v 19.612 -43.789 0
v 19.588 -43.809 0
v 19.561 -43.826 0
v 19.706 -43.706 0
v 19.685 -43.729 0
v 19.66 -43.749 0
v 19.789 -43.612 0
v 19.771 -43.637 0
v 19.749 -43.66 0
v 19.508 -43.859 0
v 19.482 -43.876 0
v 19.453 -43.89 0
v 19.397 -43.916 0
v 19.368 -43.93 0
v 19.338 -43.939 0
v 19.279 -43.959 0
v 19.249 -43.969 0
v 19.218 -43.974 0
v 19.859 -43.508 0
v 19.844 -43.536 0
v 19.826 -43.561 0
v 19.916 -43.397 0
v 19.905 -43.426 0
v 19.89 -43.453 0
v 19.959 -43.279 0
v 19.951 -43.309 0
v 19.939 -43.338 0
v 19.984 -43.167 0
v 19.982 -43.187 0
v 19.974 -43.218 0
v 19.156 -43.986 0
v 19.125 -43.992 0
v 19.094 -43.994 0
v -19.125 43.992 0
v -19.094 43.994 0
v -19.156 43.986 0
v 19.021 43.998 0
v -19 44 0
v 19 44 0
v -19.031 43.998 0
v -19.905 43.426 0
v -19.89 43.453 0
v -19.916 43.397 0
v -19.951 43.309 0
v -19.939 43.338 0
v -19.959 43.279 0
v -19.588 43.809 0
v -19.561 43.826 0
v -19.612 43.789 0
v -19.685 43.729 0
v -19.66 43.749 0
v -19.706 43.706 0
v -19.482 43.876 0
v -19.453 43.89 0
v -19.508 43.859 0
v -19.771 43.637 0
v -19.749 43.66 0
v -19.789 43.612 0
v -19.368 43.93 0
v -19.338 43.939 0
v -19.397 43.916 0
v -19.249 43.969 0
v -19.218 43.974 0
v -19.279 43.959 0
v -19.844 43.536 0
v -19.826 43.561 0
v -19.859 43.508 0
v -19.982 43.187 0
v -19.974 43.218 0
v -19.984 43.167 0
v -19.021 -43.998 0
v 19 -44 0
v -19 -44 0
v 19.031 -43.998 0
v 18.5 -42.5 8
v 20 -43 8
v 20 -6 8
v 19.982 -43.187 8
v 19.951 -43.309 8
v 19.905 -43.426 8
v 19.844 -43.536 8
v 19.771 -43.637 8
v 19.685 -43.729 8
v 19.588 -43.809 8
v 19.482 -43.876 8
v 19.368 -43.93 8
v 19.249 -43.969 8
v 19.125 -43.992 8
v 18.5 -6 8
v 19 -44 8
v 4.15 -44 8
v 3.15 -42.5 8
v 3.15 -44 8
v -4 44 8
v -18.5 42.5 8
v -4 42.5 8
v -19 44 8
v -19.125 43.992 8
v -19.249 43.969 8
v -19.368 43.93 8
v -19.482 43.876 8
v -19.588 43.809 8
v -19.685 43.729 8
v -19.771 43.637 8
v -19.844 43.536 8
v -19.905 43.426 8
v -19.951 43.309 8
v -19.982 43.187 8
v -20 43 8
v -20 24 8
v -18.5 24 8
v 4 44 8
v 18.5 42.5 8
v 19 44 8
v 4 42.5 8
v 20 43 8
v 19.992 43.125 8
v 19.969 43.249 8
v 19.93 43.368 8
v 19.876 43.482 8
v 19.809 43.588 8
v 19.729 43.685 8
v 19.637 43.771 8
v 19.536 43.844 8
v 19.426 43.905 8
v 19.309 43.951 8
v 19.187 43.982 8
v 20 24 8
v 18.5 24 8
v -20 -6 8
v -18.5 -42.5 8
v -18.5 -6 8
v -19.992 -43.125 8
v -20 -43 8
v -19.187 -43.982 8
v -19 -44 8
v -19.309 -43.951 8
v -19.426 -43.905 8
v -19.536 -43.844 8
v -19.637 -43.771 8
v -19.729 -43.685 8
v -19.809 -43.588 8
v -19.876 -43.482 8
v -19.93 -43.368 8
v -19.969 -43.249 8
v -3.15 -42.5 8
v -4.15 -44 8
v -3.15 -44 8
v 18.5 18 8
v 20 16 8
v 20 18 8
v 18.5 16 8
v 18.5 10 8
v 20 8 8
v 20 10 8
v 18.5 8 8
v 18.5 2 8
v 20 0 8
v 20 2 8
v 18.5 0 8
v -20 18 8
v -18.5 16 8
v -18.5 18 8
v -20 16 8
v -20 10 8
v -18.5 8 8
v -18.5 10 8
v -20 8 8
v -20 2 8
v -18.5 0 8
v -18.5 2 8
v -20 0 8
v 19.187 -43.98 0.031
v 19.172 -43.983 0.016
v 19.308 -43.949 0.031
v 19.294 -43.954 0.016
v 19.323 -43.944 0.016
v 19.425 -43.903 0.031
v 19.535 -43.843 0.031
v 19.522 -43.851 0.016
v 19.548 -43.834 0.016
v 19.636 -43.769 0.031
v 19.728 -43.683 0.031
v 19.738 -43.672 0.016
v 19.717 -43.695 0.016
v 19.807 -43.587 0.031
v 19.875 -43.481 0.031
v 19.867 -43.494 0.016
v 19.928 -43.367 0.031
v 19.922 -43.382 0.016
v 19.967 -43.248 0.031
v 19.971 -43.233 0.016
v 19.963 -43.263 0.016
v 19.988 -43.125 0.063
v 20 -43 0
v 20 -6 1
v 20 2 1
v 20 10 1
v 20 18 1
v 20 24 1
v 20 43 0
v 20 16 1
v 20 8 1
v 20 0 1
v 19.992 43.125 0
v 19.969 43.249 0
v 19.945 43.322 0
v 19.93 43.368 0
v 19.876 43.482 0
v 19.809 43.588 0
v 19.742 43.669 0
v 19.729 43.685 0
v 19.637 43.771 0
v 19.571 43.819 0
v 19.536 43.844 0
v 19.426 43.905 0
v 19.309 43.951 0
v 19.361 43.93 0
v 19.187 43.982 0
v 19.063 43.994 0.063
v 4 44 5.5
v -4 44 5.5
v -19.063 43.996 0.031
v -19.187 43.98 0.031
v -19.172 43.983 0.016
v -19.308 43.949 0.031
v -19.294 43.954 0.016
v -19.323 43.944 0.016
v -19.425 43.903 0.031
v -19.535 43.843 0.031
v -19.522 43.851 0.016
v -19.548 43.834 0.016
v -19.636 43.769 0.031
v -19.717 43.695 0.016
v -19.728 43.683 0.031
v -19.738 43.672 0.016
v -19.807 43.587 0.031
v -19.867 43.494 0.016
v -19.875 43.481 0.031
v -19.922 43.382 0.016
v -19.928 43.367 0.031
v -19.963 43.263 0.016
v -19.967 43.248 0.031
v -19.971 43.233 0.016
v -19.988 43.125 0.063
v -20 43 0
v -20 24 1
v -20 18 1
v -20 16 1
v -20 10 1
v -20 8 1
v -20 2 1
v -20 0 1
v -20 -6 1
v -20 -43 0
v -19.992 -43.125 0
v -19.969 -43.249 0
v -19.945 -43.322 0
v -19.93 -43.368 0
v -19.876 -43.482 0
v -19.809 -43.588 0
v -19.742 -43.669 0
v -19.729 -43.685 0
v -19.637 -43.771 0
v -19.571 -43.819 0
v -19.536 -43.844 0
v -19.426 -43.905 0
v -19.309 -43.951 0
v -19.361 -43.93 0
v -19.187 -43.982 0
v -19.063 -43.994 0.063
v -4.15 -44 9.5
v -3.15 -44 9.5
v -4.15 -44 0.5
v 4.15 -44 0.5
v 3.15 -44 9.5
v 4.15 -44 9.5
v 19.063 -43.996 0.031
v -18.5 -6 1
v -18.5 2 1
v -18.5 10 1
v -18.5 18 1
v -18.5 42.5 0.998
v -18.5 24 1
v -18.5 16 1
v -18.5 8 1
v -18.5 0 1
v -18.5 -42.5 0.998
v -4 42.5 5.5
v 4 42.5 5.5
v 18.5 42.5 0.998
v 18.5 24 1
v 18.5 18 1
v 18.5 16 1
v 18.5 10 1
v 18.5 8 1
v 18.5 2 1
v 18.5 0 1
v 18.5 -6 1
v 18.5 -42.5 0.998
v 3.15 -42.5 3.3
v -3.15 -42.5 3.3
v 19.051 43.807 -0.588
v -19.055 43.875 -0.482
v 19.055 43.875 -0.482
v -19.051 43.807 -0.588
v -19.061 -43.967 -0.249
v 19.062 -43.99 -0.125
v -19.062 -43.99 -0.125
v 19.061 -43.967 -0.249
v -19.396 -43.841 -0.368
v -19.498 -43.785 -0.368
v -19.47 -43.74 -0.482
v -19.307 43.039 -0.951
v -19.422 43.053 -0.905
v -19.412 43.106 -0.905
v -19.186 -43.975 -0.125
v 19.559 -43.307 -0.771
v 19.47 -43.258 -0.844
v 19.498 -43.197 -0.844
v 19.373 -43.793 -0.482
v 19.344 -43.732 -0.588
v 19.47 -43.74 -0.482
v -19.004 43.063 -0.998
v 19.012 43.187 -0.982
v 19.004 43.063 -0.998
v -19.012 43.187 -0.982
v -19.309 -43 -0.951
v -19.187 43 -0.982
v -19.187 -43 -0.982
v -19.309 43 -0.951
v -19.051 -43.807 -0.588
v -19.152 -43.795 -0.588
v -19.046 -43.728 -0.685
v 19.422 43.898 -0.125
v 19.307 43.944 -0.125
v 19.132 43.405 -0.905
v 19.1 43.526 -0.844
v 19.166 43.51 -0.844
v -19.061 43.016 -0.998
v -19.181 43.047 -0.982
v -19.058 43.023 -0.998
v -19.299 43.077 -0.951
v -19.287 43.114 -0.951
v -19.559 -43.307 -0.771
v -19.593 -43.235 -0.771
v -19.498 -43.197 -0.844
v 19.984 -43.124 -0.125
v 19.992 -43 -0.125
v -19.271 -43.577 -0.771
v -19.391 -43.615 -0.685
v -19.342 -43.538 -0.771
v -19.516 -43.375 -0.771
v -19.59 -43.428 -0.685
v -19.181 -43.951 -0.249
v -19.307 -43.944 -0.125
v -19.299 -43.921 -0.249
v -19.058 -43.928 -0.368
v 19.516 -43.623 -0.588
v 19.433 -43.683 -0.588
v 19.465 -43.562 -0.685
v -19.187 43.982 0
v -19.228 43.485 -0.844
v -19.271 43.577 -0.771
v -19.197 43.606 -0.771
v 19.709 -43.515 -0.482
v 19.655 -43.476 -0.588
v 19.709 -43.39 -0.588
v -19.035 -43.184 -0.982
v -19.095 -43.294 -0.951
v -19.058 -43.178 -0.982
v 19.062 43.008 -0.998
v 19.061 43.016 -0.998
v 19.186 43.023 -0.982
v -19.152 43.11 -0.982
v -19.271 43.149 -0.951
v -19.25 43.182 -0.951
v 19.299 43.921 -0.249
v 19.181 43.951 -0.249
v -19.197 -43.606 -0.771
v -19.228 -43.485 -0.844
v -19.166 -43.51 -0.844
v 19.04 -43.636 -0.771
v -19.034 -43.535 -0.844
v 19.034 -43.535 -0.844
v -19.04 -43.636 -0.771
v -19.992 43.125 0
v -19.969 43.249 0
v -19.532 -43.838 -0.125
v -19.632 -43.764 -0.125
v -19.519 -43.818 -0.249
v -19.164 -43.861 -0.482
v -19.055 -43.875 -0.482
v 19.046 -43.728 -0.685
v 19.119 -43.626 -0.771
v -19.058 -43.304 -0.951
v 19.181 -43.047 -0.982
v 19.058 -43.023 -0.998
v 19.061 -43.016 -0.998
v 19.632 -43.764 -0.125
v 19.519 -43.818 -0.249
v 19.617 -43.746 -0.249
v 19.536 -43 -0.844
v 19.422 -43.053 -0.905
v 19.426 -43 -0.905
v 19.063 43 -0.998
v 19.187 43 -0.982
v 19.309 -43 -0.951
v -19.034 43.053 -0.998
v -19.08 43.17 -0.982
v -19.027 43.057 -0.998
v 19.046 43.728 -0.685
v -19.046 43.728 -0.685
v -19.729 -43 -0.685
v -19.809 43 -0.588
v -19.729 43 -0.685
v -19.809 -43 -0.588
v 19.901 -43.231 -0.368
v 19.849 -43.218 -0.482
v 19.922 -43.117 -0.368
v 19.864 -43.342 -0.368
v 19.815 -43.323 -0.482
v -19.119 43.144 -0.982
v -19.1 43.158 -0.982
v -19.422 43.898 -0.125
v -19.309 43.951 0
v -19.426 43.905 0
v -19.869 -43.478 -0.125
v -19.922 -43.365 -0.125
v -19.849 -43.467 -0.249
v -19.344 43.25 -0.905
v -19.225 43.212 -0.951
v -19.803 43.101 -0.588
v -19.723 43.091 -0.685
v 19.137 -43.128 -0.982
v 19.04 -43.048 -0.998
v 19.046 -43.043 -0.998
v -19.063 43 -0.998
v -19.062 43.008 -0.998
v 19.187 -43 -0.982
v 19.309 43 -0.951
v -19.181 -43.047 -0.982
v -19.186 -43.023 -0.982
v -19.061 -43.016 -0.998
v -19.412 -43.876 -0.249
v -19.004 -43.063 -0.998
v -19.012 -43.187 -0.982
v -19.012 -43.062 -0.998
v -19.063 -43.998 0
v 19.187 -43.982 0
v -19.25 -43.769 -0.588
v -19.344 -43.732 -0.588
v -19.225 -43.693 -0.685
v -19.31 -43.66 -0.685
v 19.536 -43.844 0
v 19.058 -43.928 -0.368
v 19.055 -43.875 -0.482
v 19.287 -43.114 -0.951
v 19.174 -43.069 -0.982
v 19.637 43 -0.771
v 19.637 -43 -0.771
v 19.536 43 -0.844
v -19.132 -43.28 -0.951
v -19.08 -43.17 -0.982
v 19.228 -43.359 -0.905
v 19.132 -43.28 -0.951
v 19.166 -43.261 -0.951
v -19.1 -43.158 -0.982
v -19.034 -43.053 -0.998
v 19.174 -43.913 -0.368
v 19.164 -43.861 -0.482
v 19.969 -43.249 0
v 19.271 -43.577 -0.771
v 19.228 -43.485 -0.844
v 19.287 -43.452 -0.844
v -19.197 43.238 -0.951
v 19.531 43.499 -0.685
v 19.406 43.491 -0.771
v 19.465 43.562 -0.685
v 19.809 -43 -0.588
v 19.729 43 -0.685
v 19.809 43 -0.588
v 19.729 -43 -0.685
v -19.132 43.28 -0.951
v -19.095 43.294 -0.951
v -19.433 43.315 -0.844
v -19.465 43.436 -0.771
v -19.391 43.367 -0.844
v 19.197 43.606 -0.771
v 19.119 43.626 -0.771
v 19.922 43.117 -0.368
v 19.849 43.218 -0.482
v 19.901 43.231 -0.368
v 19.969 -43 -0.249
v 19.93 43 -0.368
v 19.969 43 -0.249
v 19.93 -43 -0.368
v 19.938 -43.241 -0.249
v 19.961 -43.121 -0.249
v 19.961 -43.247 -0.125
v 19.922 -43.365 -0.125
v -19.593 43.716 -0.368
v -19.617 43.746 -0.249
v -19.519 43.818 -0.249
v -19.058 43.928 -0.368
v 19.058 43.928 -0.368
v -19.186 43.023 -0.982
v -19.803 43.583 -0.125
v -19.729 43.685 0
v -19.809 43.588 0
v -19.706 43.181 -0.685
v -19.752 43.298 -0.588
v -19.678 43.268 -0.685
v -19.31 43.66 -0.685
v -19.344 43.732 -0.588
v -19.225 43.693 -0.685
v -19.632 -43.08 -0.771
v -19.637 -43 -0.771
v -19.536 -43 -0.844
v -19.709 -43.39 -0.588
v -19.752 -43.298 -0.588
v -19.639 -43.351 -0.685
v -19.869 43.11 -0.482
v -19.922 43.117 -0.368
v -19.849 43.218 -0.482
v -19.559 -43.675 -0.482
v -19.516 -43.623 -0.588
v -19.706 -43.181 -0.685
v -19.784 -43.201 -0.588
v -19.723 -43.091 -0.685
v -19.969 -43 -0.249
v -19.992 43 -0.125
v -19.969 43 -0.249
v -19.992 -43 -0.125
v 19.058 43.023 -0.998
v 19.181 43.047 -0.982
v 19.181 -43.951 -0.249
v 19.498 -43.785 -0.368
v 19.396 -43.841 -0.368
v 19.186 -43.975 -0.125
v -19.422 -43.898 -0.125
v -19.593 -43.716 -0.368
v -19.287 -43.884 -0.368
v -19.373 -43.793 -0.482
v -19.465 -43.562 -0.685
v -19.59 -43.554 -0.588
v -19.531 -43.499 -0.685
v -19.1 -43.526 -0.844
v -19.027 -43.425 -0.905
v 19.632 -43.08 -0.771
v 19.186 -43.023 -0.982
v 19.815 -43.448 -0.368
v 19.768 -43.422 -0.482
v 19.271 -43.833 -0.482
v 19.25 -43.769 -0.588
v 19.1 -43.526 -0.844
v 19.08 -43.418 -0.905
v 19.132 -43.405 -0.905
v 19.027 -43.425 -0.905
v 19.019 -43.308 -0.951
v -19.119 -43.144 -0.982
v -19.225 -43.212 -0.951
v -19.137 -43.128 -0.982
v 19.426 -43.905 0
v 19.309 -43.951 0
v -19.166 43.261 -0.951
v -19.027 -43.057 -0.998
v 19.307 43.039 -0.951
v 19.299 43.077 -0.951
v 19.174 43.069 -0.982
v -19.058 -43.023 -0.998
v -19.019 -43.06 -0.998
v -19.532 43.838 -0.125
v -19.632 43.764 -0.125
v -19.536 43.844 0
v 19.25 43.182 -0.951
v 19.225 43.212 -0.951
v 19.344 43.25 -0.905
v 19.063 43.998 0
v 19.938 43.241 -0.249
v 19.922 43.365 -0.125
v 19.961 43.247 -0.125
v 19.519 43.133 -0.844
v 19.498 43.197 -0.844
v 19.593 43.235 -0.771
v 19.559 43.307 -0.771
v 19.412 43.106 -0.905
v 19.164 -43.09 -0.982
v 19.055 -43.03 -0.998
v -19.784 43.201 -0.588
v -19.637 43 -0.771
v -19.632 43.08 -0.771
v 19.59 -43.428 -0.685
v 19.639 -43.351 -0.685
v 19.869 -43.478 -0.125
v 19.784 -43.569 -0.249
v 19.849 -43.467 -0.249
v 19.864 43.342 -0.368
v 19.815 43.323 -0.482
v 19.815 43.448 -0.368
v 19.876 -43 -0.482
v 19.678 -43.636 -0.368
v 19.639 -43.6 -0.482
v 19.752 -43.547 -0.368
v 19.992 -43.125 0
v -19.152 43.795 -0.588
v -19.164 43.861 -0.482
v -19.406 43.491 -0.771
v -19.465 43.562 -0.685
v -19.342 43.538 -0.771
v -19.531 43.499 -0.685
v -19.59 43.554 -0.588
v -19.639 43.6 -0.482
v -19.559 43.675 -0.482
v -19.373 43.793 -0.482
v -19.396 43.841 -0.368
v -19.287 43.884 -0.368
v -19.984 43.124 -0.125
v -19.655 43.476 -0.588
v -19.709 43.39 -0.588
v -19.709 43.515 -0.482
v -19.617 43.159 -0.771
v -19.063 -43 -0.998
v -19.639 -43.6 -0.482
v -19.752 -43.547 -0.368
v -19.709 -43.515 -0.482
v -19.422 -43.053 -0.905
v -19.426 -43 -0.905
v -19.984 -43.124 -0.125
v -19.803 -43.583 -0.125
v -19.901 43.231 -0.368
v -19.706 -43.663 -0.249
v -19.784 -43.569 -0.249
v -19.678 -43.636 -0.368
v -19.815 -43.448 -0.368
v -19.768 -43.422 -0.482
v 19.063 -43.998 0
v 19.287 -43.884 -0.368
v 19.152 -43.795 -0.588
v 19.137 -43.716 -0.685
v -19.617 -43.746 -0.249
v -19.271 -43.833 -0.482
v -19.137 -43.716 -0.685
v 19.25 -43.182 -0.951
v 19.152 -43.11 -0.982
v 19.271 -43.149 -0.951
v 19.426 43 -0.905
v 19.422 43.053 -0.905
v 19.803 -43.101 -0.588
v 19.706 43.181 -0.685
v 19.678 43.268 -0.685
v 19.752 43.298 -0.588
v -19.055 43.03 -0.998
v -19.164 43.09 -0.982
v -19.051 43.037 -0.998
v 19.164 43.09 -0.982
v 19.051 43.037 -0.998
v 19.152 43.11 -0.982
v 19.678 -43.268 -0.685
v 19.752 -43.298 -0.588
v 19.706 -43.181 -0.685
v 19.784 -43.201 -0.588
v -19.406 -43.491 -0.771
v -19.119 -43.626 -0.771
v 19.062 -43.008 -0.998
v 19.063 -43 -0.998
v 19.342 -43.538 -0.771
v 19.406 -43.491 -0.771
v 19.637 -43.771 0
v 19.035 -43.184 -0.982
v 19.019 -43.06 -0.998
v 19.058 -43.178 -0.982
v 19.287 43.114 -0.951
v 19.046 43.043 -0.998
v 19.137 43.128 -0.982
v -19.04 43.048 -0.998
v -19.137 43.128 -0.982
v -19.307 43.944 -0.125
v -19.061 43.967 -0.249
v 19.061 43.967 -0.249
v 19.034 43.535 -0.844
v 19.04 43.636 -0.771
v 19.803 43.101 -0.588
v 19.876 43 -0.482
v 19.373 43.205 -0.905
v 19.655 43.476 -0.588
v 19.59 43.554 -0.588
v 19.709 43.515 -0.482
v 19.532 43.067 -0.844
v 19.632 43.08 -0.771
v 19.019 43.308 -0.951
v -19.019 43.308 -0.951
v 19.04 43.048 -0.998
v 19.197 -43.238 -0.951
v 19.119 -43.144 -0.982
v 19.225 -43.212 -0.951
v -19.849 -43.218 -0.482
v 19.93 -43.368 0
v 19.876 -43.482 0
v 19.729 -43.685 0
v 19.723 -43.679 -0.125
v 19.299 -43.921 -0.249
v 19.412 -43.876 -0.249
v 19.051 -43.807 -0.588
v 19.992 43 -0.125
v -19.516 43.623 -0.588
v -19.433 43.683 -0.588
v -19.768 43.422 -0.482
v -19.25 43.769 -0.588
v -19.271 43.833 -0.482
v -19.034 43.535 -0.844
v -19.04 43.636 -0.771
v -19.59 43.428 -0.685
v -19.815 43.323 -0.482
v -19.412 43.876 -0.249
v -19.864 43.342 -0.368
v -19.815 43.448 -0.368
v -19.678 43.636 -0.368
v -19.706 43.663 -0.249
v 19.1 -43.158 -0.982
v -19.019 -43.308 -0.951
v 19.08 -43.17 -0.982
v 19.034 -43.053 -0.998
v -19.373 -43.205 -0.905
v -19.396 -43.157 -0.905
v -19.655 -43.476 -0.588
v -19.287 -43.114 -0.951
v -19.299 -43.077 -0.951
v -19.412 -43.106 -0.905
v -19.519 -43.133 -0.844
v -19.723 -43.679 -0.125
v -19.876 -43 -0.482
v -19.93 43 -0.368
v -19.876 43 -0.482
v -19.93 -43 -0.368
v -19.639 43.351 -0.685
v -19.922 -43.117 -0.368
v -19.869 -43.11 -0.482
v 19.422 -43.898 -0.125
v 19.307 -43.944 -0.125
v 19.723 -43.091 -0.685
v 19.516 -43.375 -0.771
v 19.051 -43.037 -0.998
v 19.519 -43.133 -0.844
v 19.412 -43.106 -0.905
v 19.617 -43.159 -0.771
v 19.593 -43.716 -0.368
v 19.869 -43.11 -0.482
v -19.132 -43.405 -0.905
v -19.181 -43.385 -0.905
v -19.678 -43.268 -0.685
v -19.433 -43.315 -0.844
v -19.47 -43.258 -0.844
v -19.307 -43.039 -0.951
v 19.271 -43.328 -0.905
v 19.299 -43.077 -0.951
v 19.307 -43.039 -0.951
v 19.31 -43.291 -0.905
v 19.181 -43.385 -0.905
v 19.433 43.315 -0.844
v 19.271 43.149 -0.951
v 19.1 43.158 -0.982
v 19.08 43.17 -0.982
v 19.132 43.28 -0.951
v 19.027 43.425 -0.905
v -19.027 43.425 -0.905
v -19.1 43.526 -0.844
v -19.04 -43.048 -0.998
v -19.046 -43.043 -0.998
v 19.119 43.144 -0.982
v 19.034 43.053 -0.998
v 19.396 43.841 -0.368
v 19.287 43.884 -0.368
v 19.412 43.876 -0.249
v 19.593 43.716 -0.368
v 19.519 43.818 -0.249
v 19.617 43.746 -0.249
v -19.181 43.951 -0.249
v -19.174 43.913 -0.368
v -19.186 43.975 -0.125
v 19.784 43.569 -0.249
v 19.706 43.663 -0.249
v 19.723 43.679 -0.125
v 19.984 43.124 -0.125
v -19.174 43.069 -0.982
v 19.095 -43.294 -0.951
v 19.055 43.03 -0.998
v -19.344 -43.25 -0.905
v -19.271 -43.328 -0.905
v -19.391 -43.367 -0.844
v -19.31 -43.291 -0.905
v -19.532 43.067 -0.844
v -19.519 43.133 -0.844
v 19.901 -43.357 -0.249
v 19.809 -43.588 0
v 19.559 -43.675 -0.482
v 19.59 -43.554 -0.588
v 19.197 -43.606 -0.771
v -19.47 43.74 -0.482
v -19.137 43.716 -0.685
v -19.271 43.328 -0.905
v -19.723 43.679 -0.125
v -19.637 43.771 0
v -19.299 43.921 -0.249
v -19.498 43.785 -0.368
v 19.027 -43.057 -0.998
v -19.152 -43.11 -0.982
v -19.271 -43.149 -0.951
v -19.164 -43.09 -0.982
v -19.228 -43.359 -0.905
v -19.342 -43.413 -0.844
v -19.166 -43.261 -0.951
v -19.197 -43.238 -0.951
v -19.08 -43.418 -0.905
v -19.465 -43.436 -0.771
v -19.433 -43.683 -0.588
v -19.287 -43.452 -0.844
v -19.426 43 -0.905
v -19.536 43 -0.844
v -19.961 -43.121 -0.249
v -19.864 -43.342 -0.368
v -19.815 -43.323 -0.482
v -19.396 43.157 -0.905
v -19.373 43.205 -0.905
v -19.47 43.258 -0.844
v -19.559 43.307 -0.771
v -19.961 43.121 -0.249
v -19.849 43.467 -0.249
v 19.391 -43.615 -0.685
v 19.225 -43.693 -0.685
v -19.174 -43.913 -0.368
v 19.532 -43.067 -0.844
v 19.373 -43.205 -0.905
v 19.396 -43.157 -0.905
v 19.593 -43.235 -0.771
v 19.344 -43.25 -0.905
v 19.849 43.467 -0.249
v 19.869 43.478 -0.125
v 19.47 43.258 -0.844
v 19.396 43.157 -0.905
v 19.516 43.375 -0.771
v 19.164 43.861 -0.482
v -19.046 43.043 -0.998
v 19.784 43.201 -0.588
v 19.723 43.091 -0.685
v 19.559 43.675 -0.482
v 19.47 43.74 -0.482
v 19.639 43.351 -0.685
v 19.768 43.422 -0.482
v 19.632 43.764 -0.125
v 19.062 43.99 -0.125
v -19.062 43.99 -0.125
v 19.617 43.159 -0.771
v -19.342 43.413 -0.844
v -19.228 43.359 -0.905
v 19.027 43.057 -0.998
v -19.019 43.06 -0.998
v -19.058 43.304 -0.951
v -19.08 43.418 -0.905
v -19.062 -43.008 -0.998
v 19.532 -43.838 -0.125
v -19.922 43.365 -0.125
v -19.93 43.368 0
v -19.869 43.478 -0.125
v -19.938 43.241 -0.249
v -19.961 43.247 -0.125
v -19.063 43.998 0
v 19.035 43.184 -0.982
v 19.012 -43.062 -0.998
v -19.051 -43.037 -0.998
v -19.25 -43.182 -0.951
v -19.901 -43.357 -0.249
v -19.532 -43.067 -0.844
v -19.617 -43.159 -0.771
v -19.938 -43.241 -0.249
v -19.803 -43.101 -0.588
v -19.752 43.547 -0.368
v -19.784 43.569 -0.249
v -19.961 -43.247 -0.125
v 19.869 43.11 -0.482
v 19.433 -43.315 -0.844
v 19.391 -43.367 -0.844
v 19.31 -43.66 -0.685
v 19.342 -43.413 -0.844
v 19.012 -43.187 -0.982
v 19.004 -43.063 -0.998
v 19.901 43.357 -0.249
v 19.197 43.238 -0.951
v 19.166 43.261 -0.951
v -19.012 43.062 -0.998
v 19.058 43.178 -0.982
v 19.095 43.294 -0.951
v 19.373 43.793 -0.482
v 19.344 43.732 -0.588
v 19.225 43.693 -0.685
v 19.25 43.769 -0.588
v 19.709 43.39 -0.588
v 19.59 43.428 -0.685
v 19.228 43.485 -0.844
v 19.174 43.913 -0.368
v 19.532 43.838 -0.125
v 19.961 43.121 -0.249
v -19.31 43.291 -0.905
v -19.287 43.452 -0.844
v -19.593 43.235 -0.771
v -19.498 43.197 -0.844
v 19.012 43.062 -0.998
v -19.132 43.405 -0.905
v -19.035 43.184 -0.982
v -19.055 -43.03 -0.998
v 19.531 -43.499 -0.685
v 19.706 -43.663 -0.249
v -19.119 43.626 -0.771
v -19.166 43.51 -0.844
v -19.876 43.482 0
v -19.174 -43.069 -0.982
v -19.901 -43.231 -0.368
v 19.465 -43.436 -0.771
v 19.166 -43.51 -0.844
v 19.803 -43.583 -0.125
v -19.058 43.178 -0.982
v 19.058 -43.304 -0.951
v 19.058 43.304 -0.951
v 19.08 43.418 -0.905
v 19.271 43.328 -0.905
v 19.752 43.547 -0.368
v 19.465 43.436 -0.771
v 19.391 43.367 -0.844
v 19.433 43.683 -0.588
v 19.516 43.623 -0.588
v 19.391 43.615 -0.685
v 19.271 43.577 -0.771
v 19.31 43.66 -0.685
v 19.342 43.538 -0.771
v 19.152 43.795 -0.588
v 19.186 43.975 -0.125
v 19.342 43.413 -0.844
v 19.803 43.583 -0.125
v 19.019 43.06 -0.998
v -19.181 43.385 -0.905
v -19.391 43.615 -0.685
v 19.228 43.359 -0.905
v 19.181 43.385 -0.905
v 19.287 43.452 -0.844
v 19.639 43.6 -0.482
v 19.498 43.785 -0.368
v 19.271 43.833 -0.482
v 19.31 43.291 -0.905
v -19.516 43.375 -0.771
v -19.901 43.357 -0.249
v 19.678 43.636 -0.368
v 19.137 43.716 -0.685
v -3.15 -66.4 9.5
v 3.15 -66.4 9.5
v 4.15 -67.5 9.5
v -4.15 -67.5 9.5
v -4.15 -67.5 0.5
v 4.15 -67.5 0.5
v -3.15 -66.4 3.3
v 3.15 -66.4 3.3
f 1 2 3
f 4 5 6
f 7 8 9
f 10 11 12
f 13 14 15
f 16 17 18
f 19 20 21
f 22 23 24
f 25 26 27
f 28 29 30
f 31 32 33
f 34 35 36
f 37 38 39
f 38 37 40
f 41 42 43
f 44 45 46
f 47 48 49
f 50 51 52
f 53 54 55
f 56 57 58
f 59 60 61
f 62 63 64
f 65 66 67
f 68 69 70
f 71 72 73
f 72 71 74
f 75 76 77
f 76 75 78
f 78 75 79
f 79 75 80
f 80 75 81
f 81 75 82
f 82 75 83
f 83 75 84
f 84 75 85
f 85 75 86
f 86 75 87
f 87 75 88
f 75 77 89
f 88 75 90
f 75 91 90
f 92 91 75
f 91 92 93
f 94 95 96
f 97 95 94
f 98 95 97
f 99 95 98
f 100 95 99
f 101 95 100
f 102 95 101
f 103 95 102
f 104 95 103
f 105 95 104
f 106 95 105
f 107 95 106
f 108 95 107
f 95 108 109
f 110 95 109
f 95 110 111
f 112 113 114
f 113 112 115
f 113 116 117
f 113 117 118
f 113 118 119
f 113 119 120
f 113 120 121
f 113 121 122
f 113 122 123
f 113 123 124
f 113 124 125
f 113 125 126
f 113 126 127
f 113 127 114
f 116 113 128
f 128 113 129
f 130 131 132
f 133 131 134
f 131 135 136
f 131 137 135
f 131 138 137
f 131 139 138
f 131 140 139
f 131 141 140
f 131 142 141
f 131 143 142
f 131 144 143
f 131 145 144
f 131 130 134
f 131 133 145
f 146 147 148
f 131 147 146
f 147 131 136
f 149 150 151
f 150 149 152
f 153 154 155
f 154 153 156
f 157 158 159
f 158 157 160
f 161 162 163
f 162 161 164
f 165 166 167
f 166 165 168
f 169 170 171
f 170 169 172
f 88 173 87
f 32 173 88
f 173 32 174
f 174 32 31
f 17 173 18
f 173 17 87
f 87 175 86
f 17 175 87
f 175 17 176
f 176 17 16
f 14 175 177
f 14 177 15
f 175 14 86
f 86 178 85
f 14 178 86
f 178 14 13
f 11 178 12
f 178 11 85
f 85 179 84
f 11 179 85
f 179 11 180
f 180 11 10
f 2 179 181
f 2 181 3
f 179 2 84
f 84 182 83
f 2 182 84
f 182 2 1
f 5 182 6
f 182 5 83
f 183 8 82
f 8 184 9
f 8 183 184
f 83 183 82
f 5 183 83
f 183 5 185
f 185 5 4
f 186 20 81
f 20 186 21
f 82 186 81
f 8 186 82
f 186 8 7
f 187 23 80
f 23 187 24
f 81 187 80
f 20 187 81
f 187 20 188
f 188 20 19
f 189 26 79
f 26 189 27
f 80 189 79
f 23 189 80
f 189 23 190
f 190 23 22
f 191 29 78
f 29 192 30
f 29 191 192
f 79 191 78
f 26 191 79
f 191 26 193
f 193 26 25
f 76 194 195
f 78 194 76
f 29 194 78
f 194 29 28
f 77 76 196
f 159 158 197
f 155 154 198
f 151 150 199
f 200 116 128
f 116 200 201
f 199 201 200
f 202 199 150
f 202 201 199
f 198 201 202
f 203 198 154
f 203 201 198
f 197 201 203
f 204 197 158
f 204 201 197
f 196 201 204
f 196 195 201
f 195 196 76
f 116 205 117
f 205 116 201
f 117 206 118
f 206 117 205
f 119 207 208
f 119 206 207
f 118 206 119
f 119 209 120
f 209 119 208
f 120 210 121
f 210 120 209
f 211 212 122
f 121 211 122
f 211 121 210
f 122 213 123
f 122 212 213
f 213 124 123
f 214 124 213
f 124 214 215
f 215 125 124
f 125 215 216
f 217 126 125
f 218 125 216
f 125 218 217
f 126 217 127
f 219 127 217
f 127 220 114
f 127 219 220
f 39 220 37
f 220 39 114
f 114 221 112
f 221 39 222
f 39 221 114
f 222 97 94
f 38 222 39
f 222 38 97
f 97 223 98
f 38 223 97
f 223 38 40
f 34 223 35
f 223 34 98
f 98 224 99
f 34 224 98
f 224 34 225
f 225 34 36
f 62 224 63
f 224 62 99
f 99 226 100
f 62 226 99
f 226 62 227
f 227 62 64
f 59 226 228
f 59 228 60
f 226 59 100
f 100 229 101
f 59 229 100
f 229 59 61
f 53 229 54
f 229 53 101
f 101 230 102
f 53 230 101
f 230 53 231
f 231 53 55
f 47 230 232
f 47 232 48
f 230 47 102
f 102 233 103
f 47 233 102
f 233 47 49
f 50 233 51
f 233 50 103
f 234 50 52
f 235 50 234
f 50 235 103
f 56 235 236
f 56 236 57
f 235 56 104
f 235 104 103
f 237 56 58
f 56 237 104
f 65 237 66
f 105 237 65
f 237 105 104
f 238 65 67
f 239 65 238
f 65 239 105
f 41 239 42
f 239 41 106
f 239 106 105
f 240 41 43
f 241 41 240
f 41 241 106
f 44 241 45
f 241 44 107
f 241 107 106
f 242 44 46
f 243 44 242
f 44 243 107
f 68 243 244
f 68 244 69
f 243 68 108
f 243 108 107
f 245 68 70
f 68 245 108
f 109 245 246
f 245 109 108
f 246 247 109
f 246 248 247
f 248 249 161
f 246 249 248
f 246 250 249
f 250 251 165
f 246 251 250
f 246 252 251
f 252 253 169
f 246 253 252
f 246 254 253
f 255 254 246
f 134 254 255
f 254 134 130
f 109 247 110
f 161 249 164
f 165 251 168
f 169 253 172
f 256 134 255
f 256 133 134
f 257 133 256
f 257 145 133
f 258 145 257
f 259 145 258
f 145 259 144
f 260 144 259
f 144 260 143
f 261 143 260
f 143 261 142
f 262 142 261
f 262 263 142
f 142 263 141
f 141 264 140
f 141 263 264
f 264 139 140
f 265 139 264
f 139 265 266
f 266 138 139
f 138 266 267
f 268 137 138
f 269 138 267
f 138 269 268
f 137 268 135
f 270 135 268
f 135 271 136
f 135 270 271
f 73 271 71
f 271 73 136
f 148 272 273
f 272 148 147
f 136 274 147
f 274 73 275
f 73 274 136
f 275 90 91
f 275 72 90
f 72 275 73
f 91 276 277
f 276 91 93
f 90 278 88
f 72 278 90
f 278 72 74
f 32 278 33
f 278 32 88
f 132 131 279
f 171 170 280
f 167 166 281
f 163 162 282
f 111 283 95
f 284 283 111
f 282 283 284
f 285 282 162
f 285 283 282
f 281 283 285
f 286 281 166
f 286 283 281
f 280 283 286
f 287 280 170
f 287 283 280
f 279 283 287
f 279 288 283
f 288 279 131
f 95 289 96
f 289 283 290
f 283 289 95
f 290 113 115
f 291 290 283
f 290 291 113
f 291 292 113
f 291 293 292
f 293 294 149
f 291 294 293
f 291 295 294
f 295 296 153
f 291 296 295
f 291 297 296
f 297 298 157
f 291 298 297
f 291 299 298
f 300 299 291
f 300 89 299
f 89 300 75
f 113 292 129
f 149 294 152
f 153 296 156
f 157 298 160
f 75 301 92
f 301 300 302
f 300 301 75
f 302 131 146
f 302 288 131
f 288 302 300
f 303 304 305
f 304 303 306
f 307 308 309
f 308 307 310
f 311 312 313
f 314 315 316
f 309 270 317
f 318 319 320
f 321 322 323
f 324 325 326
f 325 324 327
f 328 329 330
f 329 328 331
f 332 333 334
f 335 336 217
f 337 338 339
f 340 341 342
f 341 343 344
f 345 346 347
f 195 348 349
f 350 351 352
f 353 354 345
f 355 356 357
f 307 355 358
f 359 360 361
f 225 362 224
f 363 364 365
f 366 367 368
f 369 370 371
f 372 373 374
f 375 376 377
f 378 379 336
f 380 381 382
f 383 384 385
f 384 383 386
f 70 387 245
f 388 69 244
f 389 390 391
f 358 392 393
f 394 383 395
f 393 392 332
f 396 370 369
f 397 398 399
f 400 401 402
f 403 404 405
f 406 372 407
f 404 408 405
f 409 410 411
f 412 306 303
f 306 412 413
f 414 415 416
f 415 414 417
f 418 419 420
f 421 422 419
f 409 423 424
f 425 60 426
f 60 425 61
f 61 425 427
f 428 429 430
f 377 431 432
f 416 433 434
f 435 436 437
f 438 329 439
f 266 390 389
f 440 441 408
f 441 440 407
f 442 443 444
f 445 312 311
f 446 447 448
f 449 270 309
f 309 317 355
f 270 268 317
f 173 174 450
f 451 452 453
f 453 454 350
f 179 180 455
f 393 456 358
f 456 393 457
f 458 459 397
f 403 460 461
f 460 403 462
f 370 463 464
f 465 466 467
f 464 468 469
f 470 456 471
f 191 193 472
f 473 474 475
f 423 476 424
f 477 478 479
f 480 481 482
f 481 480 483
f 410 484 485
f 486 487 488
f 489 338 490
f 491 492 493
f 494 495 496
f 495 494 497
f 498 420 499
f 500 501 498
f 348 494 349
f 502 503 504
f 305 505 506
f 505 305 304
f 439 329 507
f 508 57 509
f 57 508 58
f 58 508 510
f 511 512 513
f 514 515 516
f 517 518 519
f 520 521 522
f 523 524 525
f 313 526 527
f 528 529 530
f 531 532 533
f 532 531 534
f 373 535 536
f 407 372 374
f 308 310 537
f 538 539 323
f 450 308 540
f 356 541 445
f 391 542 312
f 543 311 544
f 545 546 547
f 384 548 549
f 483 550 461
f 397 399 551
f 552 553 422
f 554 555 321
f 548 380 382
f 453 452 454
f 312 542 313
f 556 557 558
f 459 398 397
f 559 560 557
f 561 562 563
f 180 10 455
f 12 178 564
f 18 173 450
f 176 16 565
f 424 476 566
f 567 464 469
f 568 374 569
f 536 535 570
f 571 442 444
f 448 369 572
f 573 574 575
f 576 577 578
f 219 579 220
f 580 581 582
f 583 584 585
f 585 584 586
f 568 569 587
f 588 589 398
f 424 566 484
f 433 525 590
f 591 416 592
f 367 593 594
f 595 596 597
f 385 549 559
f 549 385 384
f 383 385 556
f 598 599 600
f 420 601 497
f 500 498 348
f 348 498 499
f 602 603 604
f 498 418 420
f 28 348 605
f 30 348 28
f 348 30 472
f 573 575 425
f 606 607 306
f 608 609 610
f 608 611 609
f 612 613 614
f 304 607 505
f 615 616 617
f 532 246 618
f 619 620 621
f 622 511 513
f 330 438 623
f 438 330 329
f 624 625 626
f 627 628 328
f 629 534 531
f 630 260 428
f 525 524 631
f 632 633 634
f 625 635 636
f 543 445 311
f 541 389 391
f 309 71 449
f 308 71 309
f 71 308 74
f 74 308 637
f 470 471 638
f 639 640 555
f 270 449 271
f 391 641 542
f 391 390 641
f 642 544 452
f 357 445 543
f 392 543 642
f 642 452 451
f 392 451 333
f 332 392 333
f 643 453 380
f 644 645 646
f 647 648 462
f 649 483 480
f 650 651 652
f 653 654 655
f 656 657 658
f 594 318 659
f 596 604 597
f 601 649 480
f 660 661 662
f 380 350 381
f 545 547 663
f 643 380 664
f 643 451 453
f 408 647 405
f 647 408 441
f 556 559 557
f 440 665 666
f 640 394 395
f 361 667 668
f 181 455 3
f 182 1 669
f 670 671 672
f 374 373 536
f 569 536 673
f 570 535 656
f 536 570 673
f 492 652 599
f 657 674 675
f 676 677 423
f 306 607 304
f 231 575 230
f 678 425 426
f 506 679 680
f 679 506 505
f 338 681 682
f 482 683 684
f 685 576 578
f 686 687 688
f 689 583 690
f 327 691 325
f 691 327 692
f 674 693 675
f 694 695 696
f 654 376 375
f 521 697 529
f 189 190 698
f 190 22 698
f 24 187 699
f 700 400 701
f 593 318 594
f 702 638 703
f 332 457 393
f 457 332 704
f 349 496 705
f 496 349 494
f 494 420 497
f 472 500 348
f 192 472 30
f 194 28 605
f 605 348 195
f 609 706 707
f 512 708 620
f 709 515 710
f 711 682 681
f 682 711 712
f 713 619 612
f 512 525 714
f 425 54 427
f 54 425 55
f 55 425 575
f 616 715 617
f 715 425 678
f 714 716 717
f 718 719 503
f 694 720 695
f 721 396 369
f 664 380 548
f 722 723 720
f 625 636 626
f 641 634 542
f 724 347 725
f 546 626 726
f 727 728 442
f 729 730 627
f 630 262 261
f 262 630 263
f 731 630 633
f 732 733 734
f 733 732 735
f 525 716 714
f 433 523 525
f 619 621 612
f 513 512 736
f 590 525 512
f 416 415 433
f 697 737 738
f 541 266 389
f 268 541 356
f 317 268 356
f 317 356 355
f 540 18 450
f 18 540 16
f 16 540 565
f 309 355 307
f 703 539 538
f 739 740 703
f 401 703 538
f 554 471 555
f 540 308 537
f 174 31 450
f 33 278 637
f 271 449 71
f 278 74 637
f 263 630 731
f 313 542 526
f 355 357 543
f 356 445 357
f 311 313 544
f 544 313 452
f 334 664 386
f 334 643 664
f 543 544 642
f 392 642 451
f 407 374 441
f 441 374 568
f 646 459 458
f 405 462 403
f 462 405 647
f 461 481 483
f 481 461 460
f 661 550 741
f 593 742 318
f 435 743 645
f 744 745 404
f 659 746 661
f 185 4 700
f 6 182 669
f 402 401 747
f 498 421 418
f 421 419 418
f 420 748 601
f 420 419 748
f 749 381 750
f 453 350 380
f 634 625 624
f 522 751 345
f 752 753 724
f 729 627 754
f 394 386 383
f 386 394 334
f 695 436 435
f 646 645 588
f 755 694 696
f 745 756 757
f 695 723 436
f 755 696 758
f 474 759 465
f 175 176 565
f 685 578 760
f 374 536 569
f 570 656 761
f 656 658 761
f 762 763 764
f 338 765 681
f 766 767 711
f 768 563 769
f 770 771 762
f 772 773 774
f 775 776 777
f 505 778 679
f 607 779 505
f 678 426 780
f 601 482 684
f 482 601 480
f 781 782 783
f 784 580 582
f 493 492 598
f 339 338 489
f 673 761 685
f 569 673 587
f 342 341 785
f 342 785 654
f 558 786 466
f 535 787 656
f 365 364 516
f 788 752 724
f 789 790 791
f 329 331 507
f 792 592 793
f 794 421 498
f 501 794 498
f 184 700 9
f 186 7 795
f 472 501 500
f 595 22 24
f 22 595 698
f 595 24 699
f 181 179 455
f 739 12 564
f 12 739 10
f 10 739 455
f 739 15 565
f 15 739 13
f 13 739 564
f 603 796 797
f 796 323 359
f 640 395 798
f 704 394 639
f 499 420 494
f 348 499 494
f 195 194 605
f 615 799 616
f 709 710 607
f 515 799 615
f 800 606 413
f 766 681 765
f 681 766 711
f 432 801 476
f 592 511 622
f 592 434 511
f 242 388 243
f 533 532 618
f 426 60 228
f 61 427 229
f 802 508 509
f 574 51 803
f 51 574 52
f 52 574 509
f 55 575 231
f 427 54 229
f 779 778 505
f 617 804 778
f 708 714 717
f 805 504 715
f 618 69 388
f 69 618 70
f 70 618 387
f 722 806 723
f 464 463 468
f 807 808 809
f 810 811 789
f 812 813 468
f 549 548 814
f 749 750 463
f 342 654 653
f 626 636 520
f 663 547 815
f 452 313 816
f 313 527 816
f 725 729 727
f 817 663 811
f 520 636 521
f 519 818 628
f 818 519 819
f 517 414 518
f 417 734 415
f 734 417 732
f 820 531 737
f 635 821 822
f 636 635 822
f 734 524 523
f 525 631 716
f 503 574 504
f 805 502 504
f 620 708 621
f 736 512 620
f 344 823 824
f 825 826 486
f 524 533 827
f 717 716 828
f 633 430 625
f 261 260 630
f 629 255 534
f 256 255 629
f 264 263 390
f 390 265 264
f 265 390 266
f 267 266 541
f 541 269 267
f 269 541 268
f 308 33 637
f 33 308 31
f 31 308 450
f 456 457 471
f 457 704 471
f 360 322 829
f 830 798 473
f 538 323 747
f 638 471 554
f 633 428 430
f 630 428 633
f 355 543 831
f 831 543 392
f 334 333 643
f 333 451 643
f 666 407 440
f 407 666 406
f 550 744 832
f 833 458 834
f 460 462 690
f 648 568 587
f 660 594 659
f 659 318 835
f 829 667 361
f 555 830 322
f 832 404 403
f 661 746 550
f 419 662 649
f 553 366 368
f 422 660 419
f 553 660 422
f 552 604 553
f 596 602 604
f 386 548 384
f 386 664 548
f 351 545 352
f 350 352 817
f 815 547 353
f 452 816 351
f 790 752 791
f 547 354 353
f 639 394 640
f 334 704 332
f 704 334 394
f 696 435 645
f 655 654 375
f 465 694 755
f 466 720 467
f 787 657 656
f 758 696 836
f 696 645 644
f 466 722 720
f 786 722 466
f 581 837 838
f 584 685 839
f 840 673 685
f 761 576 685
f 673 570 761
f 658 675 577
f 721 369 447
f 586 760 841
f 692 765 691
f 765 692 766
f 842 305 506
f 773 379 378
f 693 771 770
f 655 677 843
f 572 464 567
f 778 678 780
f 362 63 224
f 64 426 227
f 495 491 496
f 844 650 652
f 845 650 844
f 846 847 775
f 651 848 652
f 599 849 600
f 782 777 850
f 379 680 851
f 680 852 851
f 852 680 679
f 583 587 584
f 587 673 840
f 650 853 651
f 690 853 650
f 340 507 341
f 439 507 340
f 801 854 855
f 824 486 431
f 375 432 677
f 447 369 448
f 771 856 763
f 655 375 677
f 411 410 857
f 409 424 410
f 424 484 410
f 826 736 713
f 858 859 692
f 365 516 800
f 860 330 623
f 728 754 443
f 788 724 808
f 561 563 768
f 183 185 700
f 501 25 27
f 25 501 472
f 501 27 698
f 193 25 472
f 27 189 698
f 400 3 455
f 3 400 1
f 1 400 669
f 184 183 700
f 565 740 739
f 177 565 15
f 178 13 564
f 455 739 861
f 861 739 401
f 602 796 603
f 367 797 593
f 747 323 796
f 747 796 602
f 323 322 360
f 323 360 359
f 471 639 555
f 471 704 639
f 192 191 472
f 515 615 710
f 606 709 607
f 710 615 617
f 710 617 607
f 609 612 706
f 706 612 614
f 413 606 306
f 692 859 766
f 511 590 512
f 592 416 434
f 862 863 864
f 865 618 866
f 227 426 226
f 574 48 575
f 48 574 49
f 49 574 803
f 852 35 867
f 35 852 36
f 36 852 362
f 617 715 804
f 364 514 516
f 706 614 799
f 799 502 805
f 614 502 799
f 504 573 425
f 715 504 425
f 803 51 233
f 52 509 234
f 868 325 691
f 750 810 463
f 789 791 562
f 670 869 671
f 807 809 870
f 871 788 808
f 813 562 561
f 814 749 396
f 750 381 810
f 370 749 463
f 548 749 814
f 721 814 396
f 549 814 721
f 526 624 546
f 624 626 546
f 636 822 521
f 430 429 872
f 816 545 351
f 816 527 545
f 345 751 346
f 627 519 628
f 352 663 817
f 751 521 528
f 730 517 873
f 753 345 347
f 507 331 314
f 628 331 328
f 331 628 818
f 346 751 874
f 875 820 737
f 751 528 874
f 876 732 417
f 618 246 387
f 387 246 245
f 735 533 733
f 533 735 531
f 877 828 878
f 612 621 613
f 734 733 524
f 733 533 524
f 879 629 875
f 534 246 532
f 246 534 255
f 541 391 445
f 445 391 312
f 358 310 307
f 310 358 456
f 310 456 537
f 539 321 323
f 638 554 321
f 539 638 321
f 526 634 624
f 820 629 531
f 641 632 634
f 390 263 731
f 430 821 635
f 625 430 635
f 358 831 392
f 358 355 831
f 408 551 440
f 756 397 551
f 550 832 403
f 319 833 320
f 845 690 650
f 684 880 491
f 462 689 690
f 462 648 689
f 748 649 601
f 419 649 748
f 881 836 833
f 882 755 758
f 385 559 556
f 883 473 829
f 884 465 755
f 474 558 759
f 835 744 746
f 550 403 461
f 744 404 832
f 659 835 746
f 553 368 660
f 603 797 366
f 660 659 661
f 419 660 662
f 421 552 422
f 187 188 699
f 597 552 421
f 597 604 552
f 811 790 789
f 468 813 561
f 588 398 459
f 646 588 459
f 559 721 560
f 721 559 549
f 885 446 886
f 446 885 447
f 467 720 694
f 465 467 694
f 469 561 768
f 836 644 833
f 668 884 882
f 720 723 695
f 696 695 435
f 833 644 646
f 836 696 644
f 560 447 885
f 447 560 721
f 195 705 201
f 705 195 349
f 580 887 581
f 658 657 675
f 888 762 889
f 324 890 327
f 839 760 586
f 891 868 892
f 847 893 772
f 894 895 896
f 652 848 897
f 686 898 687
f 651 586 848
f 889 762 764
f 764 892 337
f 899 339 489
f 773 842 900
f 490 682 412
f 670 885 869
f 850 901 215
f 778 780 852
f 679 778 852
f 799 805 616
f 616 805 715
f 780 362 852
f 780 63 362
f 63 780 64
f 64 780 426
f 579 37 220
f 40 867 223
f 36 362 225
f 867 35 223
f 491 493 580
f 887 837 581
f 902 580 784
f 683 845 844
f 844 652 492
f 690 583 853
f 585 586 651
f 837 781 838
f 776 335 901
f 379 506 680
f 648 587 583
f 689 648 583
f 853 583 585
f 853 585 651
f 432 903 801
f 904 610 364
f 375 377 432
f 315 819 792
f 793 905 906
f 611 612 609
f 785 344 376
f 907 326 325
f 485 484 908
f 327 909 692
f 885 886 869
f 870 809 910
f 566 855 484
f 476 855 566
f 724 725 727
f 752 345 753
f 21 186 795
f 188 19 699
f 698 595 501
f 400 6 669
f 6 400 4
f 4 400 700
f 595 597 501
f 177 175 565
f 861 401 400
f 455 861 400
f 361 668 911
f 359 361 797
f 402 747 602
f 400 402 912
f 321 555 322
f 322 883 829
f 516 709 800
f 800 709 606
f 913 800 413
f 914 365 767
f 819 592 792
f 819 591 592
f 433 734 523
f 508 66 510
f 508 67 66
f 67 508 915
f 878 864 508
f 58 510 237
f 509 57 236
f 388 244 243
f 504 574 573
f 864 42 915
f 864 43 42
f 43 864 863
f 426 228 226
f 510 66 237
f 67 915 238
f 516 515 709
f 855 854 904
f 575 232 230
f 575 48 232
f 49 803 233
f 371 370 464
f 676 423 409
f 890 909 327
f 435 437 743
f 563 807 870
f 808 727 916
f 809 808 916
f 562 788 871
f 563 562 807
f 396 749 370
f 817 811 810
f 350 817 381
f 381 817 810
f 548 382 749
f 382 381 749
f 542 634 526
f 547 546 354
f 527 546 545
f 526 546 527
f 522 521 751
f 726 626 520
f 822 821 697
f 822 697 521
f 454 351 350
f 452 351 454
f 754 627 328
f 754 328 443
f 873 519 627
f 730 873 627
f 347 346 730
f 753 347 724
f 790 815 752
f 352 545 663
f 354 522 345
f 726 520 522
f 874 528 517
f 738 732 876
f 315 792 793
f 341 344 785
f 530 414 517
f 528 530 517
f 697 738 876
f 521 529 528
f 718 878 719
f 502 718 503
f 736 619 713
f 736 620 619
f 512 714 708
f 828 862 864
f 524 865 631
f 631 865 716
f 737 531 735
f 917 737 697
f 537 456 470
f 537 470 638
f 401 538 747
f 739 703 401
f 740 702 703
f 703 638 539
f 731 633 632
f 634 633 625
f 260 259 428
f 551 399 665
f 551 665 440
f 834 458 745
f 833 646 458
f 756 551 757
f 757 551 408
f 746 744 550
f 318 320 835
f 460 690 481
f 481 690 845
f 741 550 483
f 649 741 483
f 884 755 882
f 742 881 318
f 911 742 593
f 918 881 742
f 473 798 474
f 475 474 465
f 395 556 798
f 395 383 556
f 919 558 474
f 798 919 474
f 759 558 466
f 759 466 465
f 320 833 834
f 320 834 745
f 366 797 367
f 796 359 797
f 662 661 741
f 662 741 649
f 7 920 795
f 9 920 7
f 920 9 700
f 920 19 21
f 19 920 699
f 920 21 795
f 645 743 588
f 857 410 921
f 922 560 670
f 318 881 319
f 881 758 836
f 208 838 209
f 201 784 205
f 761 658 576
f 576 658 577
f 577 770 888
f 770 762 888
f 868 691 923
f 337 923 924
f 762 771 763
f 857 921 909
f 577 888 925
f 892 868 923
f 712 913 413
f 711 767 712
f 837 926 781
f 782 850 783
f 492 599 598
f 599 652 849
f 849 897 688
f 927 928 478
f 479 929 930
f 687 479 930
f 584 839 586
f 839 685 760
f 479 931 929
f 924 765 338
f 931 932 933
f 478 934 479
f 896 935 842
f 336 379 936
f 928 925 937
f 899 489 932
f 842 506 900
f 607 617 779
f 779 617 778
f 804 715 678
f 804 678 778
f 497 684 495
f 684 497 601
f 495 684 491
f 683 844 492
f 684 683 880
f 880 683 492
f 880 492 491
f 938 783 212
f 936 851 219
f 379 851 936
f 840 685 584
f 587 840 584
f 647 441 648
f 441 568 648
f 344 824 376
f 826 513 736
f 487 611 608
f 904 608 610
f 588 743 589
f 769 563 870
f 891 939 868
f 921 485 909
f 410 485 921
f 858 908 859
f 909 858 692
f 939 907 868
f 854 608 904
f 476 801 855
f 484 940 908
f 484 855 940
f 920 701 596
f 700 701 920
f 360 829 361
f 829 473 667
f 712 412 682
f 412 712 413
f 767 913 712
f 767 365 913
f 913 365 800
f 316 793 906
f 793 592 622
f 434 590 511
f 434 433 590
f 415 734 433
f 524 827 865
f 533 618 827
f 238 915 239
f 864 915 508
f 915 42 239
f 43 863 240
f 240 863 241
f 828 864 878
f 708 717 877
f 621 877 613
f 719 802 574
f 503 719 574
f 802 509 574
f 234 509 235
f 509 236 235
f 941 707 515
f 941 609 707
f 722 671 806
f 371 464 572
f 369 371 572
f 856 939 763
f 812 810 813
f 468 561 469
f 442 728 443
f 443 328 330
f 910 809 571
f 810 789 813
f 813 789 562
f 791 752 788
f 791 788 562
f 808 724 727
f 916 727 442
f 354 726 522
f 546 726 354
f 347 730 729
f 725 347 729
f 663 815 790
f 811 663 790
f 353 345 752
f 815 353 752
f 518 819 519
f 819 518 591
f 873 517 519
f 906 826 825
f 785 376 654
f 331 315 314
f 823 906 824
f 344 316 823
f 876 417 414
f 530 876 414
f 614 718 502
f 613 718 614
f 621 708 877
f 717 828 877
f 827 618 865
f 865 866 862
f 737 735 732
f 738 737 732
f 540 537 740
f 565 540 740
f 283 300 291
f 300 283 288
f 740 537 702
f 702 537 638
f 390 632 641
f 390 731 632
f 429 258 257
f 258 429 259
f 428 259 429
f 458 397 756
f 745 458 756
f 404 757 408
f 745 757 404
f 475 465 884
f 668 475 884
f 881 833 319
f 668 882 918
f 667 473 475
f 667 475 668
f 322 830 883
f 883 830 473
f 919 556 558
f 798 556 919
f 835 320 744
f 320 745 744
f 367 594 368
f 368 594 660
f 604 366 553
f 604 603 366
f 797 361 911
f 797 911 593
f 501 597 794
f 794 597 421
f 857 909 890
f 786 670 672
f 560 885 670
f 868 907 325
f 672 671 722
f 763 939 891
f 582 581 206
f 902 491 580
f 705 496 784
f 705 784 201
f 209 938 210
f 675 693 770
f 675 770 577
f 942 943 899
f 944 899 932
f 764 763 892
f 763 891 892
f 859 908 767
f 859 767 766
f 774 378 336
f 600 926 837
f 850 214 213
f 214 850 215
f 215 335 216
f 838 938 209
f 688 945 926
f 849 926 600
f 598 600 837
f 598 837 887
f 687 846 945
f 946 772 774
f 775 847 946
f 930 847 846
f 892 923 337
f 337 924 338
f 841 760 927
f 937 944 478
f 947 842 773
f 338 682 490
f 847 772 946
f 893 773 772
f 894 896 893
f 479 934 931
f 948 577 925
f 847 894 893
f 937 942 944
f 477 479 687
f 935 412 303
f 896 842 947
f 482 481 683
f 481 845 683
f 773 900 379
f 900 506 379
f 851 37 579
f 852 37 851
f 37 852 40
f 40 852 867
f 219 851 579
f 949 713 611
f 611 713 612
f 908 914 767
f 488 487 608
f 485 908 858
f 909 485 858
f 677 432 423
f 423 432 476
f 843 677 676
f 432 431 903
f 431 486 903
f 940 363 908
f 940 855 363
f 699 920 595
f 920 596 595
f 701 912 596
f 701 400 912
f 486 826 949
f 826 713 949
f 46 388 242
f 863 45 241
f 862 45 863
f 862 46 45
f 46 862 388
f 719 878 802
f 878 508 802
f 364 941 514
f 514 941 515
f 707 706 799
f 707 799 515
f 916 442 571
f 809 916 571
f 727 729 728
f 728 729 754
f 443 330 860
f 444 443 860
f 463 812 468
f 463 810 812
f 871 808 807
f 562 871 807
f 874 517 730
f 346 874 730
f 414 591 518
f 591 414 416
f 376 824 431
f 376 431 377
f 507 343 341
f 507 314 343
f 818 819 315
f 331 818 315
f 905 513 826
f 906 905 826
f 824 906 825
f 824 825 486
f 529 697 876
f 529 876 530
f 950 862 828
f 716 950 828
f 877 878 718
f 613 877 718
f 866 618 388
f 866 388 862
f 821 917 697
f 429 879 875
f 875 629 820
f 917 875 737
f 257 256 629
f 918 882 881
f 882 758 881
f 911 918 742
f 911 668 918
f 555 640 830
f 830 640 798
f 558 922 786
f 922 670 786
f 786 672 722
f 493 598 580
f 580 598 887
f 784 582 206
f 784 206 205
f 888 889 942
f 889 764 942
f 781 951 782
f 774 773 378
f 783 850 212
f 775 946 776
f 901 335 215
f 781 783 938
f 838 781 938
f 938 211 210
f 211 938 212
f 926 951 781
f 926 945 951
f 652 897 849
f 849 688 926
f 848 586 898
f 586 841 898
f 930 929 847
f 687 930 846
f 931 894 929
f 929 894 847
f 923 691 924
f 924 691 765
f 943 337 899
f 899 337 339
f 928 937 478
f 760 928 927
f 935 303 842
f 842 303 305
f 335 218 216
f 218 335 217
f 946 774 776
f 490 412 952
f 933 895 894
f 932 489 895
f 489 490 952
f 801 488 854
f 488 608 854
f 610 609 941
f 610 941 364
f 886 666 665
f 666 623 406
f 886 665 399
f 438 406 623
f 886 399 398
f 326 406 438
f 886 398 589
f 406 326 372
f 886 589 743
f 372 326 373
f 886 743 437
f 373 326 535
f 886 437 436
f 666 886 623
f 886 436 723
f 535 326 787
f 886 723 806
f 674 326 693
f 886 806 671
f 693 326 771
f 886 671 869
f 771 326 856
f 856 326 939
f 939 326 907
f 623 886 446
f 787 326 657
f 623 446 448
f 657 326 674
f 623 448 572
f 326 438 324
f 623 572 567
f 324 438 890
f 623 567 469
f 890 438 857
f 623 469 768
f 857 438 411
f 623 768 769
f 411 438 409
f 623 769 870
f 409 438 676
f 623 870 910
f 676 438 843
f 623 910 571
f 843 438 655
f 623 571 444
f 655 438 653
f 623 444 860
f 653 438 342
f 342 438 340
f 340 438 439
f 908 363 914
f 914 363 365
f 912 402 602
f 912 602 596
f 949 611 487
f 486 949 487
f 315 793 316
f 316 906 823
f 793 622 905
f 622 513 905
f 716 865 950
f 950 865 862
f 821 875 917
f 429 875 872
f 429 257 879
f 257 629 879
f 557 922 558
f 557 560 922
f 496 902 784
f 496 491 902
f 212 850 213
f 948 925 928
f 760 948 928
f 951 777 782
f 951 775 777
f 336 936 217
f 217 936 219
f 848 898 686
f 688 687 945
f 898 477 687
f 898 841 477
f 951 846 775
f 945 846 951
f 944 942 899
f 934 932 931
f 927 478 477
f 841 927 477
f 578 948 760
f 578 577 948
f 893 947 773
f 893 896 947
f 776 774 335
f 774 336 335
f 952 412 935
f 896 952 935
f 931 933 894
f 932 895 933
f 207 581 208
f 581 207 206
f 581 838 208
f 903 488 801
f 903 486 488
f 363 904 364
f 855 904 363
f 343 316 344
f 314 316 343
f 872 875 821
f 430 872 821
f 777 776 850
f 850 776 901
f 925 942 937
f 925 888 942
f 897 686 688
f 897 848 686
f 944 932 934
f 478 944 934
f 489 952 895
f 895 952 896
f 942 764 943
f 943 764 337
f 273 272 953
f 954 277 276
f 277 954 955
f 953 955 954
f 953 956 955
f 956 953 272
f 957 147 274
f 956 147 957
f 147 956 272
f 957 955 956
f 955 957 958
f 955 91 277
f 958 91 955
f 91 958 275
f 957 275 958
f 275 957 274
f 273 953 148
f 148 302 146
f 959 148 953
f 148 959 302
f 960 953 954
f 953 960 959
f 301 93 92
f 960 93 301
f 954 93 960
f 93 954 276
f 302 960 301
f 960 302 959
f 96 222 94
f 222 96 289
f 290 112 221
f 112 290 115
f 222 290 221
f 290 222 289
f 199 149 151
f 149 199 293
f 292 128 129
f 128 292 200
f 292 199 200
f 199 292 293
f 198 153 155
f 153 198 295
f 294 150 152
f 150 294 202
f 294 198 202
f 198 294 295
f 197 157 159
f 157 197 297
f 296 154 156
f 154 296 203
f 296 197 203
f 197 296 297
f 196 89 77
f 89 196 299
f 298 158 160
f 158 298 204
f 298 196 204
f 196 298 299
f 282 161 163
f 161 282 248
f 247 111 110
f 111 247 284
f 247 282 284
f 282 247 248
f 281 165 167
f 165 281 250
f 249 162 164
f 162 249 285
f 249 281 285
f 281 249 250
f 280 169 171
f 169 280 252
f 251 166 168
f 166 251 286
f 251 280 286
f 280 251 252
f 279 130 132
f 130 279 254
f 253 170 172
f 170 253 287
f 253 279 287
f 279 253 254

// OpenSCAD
$fn=50;
BOX_W = 38; // Box Width
BOX_L = 86;// Box Length
BOX_H = 8.0; // Box Height
CORNER_RADIUS = 1.0; // Radius of corners
WALL = 1.0;// Wall Thickness

MIC_OUTSIDE_WIDTH=8.3;
MIC_OUTSIDE_HEIGHT=9.0;
MIC_INSIDE_WIDTH=6.3;
MIC_LENGTH=23.5;

CON_OUTSIDE=5;
CON_INSIDE=4;
CON_LENGTH=3;

MIC_OFFSET_X = 0;
MIC_OFFSET_Y = -26.0;
MIC_OFFSET_Z = 0;



difference() {
    union() {
        linear_extrude( BOX_H )
        difference(){
            offset(r=CORNER_RADIUS) square( [BOX_W, BOX_L], center=true );
            offset(r= CORNER_RADIUS - WALL) square([BOX_W-WALL, BOX_L-WALL], center=true );
        };

        coordinates = [ [0,0],[0,BOX_L],[BOX_W,BOX_L],[BOX_W,0] ];

        translate ( [-BOX_W/2, -BOX_L/2] )
            hull()
            for (i = coordinates)
            translate(i) sphere(CORNER_RADIUS);
            
        translate([MIC_OFFSET_X, MIC_OFFSET_Y, MIC_OFFSET_Z]){
            // outside shape
            translate([0,-18.0,BOX_H-3])
            rotate([90,0,0])
            #linear_extrude(MIC_LENGTH) square([MIC_OUTSIDE_WIDTH,MIC_OUTSIDE_HEIGHT], center=true);
        }
    }
    translate([MIC_OFFSET_X, MIC_OFFSET_Y, MIC_OFFSET_Z]){
        // inside mio channel
        translate([0,-13.8,BOX_H-0.2]) // inside
        rotate([90,0,0])
        linear_extrude(MIC_LENGTH+3.1) square([MIC_INSIDE_WIDTH,MIC_OUTSIDE_HEIGHT], center=true); 
        
        // mic lid clearance
        translate([0,-15.25,BOX_H+1.11])
        rotate([90,0,0])
        linear_extrude(2.0) square([9,2.2], center=true);   
        
    }
    // cable exit
    translate([0,44.3,BOX_H-1])
    rotate([90,0,0])
    #linear_extrude(2.0) square([8,3], center=true);
    
    // gas sensor vents near
    translate([18.0,21.0,BOX_H-3])
    rotate([90,0,90])
    #linear_extrude(2.5) square([6,8], center=true);    
    
    // gas sensor vents
    translate([18.0,13.0,BOX_H-3])
    rotate([90,0,90])
    #linear_extrude(2.5) square([6,8], center=true);    
    
    // gas sensor vents
    translate([18.0,5.0,BOX_H-3])
    rotate([90,0,90])
    #linear_extrude(2.5) square([6,8], center=true);    
    
    // gas sensor vents
    translate([18.0,-3.0,BOX_H-3])
    rotate([90,0,90])
    #linear_extrude(2.5) square([6,8], center=true);    

    // gas sensor vents
    translate([-20.5,21.0,BOX_H-3])
    rotate([90,0,90])
    #linear_extrude(2.5) square([6,8], center=true);    
    
    // gas sensor vents far
    translate([-20.5,13.0,BOX_H-3])
    rotate([90,0,90])
    #linear_extrude(2.5) square([6,8], center=true);    
    
    // gas sensor vents
    translate([-20.5,5.0,BOX_H-3])
    rotate([90,0,90])
    #linear_extrude(2.5) square([6,8], center=true);    
    
    // gas sensor vents
    translate([-20.5,-3.0,BOX_H-3])
    rotate([90,0,90])
    #linear_extrude(2.5) square([6,8], center=true);    
}
